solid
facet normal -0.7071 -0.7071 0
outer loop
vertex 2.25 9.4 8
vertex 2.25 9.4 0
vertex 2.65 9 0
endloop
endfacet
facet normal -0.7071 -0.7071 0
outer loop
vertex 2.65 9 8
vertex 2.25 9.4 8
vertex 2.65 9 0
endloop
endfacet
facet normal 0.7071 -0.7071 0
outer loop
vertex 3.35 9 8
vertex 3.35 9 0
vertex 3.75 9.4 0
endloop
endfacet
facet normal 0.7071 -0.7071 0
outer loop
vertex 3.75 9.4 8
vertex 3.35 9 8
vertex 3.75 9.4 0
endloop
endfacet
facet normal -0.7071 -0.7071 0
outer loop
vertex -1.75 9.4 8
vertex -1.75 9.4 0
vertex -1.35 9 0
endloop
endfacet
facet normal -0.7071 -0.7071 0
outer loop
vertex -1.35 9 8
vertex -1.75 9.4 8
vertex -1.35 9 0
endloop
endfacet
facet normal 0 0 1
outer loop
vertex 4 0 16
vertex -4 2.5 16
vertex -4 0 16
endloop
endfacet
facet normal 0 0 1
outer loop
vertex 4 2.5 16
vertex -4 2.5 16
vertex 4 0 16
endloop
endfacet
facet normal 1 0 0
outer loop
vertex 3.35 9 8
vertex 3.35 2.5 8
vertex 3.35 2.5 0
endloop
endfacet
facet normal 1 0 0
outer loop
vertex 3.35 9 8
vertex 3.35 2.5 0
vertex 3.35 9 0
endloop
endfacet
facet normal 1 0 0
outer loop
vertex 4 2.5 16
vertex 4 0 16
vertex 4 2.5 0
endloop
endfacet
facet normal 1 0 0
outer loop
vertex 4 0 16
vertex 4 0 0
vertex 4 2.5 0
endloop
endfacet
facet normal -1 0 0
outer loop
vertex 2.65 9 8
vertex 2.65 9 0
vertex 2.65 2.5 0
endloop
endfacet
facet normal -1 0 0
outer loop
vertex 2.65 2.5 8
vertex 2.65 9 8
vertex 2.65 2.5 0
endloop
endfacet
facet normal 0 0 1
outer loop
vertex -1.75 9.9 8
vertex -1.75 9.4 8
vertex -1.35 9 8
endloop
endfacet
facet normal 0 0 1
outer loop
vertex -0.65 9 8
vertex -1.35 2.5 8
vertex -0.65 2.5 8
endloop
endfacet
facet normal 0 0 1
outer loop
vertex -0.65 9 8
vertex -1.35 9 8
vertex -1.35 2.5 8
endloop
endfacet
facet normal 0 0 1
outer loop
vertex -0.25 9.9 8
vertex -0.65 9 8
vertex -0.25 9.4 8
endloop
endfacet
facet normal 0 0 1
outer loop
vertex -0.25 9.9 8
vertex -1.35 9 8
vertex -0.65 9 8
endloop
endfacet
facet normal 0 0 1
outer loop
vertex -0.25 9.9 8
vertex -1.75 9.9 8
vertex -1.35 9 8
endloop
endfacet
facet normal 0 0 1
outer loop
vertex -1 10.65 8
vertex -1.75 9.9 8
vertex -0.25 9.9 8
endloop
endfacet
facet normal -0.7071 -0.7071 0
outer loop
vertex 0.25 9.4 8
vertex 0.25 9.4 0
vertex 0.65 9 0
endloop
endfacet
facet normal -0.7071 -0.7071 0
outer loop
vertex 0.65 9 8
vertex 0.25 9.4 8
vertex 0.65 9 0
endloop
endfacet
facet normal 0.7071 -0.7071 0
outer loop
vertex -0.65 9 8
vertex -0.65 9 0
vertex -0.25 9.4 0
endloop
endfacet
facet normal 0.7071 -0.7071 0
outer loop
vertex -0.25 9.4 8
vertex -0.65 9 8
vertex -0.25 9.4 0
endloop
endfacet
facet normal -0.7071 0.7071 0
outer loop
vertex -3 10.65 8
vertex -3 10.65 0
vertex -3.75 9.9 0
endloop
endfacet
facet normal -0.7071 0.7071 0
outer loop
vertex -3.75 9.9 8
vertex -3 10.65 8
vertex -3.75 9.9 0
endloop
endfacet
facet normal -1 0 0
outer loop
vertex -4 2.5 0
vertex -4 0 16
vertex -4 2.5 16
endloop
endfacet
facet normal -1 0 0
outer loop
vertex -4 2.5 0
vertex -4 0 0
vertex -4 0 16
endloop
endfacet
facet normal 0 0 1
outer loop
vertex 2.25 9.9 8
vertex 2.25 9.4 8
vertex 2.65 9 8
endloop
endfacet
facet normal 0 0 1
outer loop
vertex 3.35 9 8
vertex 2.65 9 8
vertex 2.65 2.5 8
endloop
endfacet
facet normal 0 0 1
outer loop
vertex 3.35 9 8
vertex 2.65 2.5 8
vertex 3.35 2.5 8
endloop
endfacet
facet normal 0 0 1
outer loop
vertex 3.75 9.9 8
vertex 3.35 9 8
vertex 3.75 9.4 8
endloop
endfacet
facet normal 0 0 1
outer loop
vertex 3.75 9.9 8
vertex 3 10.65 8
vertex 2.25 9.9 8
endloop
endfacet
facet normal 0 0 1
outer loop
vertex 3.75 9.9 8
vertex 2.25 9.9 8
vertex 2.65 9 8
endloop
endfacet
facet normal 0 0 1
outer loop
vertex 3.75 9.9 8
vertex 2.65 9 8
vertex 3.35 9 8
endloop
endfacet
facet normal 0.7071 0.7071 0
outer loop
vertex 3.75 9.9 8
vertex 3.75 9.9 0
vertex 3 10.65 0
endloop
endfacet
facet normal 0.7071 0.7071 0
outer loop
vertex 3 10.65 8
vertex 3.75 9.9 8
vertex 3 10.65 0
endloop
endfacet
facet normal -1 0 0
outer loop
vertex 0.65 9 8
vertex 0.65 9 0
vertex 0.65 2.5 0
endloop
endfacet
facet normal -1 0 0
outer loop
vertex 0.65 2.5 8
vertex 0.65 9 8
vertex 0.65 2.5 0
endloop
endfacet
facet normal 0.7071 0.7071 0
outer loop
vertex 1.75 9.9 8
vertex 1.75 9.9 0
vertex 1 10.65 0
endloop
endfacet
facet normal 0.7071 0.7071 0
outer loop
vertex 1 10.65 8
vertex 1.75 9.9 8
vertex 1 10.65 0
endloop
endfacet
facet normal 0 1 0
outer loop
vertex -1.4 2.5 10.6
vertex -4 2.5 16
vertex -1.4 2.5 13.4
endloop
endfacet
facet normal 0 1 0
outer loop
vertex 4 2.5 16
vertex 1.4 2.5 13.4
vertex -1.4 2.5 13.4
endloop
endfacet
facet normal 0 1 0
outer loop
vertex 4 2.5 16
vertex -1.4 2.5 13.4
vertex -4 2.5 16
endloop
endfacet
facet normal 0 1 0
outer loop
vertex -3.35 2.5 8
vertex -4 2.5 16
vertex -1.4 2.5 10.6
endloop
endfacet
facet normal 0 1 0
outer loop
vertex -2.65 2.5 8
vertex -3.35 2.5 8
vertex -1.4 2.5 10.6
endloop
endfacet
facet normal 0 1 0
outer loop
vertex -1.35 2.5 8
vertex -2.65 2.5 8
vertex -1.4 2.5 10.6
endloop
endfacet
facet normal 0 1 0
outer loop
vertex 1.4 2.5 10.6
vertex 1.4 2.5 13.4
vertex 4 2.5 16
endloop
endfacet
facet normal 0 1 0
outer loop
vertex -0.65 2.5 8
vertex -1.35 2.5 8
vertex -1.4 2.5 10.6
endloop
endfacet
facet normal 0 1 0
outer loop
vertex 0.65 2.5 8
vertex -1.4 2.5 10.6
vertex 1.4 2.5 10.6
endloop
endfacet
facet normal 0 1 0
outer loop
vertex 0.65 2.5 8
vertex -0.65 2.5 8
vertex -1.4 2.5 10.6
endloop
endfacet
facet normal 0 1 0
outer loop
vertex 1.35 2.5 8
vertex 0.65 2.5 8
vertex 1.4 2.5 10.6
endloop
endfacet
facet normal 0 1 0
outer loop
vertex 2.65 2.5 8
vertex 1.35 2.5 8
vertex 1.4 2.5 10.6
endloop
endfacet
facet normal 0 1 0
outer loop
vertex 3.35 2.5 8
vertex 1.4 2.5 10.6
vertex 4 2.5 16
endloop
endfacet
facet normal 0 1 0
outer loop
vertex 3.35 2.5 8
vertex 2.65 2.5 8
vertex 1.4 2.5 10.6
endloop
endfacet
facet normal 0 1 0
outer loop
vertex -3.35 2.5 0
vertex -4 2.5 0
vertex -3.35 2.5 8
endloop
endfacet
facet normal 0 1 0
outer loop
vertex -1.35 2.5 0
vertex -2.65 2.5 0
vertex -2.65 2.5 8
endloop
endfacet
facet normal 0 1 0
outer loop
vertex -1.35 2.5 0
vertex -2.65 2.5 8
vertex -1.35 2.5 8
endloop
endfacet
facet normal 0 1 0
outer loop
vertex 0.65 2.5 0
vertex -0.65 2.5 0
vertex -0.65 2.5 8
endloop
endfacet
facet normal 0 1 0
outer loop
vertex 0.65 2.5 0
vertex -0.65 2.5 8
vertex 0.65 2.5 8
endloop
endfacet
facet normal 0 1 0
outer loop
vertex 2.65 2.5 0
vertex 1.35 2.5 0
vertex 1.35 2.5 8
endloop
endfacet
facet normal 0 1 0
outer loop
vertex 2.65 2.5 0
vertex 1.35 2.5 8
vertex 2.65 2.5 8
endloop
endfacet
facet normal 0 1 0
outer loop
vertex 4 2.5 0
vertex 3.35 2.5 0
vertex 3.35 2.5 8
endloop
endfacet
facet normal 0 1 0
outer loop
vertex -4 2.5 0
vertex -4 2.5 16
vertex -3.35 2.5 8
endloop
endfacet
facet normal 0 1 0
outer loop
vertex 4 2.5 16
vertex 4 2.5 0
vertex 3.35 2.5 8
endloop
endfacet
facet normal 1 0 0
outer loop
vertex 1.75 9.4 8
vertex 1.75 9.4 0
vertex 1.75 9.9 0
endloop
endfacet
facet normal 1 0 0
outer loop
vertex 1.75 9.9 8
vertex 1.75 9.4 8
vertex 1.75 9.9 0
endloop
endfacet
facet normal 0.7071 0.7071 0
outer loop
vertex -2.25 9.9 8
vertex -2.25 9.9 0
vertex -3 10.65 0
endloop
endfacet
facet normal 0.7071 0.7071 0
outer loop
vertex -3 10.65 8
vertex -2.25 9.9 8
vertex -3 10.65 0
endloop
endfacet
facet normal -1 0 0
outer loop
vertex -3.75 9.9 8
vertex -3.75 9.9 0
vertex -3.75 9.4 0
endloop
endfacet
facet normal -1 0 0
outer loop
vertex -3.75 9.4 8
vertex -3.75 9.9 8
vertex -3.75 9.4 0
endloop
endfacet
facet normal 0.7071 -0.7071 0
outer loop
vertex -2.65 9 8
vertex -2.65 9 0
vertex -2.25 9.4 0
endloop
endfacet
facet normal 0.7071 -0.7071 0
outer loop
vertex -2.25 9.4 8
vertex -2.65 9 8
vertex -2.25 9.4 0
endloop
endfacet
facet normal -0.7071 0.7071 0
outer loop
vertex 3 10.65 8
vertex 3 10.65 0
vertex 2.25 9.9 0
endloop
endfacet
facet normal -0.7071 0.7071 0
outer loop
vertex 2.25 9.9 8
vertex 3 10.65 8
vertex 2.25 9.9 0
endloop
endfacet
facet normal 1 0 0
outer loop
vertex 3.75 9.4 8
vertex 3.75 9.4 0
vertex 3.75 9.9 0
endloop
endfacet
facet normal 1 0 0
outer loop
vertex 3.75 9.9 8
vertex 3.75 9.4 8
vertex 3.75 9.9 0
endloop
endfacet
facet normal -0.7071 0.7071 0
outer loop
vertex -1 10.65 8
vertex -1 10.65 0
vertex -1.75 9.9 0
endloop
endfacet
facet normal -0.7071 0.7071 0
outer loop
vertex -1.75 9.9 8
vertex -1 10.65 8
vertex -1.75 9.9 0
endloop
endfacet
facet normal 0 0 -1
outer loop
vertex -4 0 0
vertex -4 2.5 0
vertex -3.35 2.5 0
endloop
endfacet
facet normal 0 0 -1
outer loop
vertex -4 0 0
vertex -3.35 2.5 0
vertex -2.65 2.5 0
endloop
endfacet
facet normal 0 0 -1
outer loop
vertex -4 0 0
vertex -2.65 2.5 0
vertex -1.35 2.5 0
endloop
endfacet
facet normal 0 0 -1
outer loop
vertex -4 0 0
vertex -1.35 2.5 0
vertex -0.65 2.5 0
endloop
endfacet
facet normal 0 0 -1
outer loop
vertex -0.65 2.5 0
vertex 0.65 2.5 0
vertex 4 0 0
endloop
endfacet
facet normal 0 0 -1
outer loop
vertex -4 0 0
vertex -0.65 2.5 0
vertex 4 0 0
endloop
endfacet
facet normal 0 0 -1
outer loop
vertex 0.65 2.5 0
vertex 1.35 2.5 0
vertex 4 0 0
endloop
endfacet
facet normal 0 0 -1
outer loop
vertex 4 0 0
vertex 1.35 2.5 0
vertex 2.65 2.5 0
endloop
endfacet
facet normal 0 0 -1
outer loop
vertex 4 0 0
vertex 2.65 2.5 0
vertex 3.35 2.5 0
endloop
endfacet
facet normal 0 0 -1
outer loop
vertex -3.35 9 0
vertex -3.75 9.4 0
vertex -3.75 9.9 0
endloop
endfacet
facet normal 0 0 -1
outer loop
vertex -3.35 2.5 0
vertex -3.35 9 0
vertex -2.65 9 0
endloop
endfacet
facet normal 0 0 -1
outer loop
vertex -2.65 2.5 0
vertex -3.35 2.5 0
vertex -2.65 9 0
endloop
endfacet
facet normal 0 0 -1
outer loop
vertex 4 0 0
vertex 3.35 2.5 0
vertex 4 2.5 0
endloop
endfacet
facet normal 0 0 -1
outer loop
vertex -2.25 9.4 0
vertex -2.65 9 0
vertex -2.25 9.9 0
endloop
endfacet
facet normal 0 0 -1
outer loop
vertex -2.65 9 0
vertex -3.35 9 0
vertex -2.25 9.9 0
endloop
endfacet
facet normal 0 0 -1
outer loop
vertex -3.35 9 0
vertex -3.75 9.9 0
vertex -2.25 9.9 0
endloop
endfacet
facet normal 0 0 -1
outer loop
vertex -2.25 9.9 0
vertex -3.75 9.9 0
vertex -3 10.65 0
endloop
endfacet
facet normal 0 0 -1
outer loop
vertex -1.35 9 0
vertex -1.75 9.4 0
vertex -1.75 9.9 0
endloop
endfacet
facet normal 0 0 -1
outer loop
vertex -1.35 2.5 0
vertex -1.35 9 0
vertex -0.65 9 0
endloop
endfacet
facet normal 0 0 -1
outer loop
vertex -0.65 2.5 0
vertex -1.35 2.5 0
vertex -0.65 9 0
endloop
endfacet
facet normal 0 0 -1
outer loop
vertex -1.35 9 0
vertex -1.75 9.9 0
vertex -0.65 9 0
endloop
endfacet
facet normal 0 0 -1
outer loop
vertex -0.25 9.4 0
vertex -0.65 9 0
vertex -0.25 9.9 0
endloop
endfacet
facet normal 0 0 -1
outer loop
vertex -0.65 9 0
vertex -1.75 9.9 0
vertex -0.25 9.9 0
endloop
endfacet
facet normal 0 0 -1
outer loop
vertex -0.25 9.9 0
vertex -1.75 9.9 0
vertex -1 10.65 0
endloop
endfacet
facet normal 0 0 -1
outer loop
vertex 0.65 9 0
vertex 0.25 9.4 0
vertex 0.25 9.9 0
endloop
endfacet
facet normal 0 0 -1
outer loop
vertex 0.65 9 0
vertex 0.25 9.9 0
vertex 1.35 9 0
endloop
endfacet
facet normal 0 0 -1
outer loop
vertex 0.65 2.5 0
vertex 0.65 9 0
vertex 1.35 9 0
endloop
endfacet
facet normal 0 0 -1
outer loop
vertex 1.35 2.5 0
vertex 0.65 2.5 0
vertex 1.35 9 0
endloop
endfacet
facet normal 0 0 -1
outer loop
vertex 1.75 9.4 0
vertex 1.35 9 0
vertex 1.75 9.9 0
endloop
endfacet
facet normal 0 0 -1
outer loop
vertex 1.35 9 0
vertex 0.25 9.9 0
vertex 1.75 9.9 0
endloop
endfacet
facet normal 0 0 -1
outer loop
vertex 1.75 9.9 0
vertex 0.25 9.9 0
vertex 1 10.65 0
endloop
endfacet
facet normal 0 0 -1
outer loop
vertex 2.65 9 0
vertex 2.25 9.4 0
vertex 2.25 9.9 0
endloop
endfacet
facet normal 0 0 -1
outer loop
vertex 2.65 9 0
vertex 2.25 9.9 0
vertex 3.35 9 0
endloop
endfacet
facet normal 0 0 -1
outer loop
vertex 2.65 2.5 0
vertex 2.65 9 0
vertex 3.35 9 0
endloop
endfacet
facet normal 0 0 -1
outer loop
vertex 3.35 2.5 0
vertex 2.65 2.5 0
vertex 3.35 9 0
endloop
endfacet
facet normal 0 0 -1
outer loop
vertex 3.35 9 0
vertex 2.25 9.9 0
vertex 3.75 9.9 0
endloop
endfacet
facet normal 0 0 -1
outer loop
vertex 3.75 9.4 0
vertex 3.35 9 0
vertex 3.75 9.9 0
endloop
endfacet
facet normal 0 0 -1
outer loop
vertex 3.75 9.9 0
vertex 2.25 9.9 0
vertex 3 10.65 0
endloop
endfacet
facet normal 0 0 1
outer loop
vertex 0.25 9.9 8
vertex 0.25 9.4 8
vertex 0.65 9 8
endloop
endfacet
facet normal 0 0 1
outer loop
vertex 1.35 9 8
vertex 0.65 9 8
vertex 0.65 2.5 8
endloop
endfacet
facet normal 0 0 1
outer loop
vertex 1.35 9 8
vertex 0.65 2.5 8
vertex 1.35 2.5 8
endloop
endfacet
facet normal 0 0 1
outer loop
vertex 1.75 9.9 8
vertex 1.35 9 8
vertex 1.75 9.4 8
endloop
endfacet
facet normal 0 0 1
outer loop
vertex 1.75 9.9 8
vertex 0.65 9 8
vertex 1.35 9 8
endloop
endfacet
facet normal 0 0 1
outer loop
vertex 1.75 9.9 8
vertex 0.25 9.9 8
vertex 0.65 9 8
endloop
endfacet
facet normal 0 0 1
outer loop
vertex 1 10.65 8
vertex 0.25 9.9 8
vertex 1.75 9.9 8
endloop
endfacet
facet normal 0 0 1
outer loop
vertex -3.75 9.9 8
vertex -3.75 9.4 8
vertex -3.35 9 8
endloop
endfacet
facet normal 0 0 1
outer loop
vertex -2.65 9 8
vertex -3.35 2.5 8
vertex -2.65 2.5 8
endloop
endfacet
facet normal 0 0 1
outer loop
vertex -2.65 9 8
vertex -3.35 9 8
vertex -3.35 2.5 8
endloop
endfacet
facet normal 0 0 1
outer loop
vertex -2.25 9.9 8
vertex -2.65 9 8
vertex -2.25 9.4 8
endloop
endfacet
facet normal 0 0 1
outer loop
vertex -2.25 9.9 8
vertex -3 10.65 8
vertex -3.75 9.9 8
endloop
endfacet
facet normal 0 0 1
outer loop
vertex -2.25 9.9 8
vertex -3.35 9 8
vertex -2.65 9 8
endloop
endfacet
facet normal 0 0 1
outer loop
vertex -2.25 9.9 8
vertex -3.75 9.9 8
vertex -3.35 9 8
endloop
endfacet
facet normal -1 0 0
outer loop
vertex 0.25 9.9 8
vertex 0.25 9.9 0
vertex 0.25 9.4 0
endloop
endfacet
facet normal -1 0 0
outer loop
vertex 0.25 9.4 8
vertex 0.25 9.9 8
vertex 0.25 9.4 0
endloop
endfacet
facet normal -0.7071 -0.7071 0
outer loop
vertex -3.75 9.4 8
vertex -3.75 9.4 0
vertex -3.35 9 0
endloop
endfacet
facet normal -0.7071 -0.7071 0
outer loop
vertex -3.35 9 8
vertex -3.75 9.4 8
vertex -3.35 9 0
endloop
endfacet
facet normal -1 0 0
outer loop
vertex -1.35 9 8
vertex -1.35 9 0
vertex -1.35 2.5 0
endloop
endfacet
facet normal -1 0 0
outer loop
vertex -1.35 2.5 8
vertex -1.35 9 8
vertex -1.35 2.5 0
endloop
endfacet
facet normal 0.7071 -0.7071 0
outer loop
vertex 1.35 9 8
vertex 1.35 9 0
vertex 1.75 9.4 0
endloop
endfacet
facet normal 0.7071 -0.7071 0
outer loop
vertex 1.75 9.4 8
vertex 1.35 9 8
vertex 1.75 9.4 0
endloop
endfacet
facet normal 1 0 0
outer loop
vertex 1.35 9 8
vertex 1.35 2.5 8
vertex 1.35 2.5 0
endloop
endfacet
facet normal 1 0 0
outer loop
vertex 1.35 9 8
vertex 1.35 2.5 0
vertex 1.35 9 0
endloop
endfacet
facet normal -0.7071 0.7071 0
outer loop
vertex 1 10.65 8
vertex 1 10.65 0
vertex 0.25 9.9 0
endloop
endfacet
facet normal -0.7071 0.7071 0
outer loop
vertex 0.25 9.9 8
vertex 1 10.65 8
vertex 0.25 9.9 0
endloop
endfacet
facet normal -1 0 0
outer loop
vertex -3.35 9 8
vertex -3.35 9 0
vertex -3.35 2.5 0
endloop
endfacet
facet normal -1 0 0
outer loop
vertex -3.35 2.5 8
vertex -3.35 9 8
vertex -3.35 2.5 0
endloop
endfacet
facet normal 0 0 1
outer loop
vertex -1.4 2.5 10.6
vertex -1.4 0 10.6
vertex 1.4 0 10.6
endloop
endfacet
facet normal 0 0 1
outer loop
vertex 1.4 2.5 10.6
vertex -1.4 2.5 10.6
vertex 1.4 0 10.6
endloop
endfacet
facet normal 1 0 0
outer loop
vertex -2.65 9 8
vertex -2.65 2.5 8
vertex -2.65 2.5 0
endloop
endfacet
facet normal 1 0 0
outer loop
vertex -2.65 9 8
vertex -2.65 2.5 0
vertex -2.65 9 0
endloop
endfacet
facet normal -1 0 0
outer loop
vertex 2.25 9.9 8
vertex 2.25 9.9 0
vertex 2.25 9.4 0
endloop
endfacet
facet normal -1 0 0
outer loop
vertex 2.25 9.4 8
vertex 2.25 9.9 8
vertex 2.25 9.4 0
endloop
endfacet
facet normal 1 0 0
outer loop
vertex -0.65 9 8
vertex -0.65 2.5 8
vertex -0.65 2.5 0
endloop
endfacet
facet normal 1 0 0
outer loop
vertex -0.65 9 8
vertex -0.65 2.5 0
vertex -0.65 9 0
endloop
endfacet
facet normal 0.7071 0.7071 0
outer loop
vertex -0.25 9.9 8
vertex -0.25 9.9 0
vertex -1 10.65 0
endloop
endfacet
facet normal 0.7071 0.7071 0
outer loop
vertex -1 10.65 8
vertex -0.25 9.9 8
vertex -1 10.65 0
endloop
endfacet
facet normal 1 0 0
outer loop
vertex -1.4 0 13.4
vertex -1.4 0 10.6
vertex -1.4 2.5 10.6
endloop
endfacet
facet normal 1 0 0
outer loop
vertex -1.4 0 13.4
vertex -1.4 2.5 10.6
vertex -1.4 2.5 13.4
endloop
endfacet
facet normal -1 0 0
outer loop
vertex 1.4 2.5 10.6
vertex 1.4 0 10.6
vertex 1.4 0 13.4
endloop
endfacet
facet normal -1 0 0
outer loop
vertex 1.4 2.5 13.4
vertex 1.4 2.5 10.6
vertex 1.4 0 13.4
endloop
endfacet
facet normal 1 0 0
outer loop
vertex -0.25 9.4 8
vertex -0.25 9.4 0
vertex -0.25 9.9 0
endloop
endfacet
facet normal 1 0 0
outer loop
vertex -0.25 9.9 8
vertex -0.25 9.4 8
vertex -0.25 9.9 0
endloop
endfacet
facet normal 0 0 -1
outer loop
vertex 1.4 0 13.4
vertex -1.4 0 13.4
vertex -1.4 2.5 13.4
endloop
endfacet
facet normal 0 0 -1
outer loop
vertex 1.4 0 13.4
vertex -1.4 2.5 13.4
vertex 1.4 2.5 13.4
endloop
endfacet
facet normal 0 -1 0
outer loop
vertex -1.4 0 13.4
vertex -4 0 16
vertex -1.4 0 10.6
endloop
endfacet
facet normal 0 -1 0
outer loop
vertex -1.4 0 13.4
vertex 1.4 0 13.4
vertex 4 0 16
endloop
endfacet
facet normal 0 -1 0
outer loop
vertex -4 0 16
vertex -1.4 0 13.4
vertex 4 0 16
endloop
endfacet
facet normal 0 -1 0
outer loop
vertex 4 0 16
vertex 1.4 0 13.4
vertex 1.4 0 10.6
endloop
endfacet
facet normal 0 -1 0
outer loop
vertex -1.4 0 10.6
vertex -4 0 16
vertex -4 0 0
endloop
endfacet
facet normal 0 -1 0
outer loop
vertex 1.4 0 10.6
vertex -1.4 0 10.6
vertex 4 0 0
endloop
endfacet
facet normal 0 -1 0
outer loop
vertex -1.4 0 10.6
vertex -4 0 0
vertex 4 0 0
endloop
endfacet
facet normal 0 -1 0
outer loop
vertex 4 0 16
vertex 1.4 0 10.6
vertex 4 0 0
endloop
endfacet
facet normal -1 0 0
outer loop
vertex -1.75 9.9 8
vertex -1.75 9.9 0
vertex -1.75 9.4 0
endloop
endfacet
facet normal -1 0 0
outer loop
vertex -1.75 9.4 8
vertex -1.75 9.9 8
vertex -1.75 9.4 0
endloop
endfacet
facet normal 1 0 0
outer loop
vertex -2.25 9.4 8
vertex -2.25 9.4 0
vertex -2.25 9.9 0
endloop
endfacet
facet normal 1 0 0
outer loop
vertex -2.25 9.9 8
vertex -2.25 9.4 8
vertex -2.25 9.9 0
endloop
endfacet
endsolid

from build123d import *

# Parameters (mm, degrees)
RESSALTO_EXTRUS_O1_DEPTH = 8
ESBO_O4_W                = 8
ESBO_O4_H                = 2.5
RESSALTO_EXTRUS_O3_DEPTH = 8
ESBO_O5_W                = 2.8
ESBO_O5_H                = 2.8
CORTE_EXTRUS_O1_DEPTH    = 20.632180215


with BuildPart() as part:
    # Esboço1 → Ressalto-extrusão1 (new body)
    with BuildSketch(Plane.XY):
        Polygon((0.65, 2.5), (-0.65, 2.5), (-0.65, 9), (-0.25, 9.4), (-0.25, 9.9), (-0.75, 10.4), (-1, 10.65), (-1.25, 10.4), (-1.75, 9.9), (-1.75, 9.4), (-1.35, 9), (-1.35, 2.5), (-2.65, 2.5), (-2.65, 9), (-2.25, 9.4), (-2.25, 9.9), (-2.75, 10.4), (-3, 10.65), (-3.25, 10.4), (-3.75, 9.9), (-3.75, 9.4), (-3.35, 9), (-3.35, 2.5), (-4, 2.5), (-4, 0), (4, 0), (4, 2.5), (3.35, 2.5), (3.35, 9), (3.75, 9.4), (3.75, 9.9), (3.25, 10.4), (3, 10.65), (2.75, 10.4), (2.25, 9.9), (2.25, 9.4), (2.65, 9), (2.65, 2.5), (1.35, 2.5), (1.35, 9), (1.75, 9.4), (1.75, 9.9), (1.25, 10.4), (1, 10.65), (0.75, 10.4), (0.25, 9.9), (0.25, 9.4), (0.65, 9), align=None)
    extrude(amount=RESSALTO_EXTRUS_O1_DEPTH)

    # Esboço4 → Ressalto-extrusão3 (add)
    with BuildSketch(Plane.XY.offset(8)):
        with Locations((0, 1.25)):
            Rectangle(ESBO_O4_W, ESBO_O4_H)
    extrude(amount=RESSALTO_EXTRUS_O3_DEPTH)

    # Esboço5 → Corte-extrusão1 (cut, through all)
    with BuildSketch(Plane.XZ):
        with Locations((0, 12)):
            Rectangle(ESBO_O5_W, ESBO_O5_H)
    extrude(amount=-CORTE_EXTRUS_O1_DEPTH, mode=Mode.SUBTRACT)


solid = part.part
